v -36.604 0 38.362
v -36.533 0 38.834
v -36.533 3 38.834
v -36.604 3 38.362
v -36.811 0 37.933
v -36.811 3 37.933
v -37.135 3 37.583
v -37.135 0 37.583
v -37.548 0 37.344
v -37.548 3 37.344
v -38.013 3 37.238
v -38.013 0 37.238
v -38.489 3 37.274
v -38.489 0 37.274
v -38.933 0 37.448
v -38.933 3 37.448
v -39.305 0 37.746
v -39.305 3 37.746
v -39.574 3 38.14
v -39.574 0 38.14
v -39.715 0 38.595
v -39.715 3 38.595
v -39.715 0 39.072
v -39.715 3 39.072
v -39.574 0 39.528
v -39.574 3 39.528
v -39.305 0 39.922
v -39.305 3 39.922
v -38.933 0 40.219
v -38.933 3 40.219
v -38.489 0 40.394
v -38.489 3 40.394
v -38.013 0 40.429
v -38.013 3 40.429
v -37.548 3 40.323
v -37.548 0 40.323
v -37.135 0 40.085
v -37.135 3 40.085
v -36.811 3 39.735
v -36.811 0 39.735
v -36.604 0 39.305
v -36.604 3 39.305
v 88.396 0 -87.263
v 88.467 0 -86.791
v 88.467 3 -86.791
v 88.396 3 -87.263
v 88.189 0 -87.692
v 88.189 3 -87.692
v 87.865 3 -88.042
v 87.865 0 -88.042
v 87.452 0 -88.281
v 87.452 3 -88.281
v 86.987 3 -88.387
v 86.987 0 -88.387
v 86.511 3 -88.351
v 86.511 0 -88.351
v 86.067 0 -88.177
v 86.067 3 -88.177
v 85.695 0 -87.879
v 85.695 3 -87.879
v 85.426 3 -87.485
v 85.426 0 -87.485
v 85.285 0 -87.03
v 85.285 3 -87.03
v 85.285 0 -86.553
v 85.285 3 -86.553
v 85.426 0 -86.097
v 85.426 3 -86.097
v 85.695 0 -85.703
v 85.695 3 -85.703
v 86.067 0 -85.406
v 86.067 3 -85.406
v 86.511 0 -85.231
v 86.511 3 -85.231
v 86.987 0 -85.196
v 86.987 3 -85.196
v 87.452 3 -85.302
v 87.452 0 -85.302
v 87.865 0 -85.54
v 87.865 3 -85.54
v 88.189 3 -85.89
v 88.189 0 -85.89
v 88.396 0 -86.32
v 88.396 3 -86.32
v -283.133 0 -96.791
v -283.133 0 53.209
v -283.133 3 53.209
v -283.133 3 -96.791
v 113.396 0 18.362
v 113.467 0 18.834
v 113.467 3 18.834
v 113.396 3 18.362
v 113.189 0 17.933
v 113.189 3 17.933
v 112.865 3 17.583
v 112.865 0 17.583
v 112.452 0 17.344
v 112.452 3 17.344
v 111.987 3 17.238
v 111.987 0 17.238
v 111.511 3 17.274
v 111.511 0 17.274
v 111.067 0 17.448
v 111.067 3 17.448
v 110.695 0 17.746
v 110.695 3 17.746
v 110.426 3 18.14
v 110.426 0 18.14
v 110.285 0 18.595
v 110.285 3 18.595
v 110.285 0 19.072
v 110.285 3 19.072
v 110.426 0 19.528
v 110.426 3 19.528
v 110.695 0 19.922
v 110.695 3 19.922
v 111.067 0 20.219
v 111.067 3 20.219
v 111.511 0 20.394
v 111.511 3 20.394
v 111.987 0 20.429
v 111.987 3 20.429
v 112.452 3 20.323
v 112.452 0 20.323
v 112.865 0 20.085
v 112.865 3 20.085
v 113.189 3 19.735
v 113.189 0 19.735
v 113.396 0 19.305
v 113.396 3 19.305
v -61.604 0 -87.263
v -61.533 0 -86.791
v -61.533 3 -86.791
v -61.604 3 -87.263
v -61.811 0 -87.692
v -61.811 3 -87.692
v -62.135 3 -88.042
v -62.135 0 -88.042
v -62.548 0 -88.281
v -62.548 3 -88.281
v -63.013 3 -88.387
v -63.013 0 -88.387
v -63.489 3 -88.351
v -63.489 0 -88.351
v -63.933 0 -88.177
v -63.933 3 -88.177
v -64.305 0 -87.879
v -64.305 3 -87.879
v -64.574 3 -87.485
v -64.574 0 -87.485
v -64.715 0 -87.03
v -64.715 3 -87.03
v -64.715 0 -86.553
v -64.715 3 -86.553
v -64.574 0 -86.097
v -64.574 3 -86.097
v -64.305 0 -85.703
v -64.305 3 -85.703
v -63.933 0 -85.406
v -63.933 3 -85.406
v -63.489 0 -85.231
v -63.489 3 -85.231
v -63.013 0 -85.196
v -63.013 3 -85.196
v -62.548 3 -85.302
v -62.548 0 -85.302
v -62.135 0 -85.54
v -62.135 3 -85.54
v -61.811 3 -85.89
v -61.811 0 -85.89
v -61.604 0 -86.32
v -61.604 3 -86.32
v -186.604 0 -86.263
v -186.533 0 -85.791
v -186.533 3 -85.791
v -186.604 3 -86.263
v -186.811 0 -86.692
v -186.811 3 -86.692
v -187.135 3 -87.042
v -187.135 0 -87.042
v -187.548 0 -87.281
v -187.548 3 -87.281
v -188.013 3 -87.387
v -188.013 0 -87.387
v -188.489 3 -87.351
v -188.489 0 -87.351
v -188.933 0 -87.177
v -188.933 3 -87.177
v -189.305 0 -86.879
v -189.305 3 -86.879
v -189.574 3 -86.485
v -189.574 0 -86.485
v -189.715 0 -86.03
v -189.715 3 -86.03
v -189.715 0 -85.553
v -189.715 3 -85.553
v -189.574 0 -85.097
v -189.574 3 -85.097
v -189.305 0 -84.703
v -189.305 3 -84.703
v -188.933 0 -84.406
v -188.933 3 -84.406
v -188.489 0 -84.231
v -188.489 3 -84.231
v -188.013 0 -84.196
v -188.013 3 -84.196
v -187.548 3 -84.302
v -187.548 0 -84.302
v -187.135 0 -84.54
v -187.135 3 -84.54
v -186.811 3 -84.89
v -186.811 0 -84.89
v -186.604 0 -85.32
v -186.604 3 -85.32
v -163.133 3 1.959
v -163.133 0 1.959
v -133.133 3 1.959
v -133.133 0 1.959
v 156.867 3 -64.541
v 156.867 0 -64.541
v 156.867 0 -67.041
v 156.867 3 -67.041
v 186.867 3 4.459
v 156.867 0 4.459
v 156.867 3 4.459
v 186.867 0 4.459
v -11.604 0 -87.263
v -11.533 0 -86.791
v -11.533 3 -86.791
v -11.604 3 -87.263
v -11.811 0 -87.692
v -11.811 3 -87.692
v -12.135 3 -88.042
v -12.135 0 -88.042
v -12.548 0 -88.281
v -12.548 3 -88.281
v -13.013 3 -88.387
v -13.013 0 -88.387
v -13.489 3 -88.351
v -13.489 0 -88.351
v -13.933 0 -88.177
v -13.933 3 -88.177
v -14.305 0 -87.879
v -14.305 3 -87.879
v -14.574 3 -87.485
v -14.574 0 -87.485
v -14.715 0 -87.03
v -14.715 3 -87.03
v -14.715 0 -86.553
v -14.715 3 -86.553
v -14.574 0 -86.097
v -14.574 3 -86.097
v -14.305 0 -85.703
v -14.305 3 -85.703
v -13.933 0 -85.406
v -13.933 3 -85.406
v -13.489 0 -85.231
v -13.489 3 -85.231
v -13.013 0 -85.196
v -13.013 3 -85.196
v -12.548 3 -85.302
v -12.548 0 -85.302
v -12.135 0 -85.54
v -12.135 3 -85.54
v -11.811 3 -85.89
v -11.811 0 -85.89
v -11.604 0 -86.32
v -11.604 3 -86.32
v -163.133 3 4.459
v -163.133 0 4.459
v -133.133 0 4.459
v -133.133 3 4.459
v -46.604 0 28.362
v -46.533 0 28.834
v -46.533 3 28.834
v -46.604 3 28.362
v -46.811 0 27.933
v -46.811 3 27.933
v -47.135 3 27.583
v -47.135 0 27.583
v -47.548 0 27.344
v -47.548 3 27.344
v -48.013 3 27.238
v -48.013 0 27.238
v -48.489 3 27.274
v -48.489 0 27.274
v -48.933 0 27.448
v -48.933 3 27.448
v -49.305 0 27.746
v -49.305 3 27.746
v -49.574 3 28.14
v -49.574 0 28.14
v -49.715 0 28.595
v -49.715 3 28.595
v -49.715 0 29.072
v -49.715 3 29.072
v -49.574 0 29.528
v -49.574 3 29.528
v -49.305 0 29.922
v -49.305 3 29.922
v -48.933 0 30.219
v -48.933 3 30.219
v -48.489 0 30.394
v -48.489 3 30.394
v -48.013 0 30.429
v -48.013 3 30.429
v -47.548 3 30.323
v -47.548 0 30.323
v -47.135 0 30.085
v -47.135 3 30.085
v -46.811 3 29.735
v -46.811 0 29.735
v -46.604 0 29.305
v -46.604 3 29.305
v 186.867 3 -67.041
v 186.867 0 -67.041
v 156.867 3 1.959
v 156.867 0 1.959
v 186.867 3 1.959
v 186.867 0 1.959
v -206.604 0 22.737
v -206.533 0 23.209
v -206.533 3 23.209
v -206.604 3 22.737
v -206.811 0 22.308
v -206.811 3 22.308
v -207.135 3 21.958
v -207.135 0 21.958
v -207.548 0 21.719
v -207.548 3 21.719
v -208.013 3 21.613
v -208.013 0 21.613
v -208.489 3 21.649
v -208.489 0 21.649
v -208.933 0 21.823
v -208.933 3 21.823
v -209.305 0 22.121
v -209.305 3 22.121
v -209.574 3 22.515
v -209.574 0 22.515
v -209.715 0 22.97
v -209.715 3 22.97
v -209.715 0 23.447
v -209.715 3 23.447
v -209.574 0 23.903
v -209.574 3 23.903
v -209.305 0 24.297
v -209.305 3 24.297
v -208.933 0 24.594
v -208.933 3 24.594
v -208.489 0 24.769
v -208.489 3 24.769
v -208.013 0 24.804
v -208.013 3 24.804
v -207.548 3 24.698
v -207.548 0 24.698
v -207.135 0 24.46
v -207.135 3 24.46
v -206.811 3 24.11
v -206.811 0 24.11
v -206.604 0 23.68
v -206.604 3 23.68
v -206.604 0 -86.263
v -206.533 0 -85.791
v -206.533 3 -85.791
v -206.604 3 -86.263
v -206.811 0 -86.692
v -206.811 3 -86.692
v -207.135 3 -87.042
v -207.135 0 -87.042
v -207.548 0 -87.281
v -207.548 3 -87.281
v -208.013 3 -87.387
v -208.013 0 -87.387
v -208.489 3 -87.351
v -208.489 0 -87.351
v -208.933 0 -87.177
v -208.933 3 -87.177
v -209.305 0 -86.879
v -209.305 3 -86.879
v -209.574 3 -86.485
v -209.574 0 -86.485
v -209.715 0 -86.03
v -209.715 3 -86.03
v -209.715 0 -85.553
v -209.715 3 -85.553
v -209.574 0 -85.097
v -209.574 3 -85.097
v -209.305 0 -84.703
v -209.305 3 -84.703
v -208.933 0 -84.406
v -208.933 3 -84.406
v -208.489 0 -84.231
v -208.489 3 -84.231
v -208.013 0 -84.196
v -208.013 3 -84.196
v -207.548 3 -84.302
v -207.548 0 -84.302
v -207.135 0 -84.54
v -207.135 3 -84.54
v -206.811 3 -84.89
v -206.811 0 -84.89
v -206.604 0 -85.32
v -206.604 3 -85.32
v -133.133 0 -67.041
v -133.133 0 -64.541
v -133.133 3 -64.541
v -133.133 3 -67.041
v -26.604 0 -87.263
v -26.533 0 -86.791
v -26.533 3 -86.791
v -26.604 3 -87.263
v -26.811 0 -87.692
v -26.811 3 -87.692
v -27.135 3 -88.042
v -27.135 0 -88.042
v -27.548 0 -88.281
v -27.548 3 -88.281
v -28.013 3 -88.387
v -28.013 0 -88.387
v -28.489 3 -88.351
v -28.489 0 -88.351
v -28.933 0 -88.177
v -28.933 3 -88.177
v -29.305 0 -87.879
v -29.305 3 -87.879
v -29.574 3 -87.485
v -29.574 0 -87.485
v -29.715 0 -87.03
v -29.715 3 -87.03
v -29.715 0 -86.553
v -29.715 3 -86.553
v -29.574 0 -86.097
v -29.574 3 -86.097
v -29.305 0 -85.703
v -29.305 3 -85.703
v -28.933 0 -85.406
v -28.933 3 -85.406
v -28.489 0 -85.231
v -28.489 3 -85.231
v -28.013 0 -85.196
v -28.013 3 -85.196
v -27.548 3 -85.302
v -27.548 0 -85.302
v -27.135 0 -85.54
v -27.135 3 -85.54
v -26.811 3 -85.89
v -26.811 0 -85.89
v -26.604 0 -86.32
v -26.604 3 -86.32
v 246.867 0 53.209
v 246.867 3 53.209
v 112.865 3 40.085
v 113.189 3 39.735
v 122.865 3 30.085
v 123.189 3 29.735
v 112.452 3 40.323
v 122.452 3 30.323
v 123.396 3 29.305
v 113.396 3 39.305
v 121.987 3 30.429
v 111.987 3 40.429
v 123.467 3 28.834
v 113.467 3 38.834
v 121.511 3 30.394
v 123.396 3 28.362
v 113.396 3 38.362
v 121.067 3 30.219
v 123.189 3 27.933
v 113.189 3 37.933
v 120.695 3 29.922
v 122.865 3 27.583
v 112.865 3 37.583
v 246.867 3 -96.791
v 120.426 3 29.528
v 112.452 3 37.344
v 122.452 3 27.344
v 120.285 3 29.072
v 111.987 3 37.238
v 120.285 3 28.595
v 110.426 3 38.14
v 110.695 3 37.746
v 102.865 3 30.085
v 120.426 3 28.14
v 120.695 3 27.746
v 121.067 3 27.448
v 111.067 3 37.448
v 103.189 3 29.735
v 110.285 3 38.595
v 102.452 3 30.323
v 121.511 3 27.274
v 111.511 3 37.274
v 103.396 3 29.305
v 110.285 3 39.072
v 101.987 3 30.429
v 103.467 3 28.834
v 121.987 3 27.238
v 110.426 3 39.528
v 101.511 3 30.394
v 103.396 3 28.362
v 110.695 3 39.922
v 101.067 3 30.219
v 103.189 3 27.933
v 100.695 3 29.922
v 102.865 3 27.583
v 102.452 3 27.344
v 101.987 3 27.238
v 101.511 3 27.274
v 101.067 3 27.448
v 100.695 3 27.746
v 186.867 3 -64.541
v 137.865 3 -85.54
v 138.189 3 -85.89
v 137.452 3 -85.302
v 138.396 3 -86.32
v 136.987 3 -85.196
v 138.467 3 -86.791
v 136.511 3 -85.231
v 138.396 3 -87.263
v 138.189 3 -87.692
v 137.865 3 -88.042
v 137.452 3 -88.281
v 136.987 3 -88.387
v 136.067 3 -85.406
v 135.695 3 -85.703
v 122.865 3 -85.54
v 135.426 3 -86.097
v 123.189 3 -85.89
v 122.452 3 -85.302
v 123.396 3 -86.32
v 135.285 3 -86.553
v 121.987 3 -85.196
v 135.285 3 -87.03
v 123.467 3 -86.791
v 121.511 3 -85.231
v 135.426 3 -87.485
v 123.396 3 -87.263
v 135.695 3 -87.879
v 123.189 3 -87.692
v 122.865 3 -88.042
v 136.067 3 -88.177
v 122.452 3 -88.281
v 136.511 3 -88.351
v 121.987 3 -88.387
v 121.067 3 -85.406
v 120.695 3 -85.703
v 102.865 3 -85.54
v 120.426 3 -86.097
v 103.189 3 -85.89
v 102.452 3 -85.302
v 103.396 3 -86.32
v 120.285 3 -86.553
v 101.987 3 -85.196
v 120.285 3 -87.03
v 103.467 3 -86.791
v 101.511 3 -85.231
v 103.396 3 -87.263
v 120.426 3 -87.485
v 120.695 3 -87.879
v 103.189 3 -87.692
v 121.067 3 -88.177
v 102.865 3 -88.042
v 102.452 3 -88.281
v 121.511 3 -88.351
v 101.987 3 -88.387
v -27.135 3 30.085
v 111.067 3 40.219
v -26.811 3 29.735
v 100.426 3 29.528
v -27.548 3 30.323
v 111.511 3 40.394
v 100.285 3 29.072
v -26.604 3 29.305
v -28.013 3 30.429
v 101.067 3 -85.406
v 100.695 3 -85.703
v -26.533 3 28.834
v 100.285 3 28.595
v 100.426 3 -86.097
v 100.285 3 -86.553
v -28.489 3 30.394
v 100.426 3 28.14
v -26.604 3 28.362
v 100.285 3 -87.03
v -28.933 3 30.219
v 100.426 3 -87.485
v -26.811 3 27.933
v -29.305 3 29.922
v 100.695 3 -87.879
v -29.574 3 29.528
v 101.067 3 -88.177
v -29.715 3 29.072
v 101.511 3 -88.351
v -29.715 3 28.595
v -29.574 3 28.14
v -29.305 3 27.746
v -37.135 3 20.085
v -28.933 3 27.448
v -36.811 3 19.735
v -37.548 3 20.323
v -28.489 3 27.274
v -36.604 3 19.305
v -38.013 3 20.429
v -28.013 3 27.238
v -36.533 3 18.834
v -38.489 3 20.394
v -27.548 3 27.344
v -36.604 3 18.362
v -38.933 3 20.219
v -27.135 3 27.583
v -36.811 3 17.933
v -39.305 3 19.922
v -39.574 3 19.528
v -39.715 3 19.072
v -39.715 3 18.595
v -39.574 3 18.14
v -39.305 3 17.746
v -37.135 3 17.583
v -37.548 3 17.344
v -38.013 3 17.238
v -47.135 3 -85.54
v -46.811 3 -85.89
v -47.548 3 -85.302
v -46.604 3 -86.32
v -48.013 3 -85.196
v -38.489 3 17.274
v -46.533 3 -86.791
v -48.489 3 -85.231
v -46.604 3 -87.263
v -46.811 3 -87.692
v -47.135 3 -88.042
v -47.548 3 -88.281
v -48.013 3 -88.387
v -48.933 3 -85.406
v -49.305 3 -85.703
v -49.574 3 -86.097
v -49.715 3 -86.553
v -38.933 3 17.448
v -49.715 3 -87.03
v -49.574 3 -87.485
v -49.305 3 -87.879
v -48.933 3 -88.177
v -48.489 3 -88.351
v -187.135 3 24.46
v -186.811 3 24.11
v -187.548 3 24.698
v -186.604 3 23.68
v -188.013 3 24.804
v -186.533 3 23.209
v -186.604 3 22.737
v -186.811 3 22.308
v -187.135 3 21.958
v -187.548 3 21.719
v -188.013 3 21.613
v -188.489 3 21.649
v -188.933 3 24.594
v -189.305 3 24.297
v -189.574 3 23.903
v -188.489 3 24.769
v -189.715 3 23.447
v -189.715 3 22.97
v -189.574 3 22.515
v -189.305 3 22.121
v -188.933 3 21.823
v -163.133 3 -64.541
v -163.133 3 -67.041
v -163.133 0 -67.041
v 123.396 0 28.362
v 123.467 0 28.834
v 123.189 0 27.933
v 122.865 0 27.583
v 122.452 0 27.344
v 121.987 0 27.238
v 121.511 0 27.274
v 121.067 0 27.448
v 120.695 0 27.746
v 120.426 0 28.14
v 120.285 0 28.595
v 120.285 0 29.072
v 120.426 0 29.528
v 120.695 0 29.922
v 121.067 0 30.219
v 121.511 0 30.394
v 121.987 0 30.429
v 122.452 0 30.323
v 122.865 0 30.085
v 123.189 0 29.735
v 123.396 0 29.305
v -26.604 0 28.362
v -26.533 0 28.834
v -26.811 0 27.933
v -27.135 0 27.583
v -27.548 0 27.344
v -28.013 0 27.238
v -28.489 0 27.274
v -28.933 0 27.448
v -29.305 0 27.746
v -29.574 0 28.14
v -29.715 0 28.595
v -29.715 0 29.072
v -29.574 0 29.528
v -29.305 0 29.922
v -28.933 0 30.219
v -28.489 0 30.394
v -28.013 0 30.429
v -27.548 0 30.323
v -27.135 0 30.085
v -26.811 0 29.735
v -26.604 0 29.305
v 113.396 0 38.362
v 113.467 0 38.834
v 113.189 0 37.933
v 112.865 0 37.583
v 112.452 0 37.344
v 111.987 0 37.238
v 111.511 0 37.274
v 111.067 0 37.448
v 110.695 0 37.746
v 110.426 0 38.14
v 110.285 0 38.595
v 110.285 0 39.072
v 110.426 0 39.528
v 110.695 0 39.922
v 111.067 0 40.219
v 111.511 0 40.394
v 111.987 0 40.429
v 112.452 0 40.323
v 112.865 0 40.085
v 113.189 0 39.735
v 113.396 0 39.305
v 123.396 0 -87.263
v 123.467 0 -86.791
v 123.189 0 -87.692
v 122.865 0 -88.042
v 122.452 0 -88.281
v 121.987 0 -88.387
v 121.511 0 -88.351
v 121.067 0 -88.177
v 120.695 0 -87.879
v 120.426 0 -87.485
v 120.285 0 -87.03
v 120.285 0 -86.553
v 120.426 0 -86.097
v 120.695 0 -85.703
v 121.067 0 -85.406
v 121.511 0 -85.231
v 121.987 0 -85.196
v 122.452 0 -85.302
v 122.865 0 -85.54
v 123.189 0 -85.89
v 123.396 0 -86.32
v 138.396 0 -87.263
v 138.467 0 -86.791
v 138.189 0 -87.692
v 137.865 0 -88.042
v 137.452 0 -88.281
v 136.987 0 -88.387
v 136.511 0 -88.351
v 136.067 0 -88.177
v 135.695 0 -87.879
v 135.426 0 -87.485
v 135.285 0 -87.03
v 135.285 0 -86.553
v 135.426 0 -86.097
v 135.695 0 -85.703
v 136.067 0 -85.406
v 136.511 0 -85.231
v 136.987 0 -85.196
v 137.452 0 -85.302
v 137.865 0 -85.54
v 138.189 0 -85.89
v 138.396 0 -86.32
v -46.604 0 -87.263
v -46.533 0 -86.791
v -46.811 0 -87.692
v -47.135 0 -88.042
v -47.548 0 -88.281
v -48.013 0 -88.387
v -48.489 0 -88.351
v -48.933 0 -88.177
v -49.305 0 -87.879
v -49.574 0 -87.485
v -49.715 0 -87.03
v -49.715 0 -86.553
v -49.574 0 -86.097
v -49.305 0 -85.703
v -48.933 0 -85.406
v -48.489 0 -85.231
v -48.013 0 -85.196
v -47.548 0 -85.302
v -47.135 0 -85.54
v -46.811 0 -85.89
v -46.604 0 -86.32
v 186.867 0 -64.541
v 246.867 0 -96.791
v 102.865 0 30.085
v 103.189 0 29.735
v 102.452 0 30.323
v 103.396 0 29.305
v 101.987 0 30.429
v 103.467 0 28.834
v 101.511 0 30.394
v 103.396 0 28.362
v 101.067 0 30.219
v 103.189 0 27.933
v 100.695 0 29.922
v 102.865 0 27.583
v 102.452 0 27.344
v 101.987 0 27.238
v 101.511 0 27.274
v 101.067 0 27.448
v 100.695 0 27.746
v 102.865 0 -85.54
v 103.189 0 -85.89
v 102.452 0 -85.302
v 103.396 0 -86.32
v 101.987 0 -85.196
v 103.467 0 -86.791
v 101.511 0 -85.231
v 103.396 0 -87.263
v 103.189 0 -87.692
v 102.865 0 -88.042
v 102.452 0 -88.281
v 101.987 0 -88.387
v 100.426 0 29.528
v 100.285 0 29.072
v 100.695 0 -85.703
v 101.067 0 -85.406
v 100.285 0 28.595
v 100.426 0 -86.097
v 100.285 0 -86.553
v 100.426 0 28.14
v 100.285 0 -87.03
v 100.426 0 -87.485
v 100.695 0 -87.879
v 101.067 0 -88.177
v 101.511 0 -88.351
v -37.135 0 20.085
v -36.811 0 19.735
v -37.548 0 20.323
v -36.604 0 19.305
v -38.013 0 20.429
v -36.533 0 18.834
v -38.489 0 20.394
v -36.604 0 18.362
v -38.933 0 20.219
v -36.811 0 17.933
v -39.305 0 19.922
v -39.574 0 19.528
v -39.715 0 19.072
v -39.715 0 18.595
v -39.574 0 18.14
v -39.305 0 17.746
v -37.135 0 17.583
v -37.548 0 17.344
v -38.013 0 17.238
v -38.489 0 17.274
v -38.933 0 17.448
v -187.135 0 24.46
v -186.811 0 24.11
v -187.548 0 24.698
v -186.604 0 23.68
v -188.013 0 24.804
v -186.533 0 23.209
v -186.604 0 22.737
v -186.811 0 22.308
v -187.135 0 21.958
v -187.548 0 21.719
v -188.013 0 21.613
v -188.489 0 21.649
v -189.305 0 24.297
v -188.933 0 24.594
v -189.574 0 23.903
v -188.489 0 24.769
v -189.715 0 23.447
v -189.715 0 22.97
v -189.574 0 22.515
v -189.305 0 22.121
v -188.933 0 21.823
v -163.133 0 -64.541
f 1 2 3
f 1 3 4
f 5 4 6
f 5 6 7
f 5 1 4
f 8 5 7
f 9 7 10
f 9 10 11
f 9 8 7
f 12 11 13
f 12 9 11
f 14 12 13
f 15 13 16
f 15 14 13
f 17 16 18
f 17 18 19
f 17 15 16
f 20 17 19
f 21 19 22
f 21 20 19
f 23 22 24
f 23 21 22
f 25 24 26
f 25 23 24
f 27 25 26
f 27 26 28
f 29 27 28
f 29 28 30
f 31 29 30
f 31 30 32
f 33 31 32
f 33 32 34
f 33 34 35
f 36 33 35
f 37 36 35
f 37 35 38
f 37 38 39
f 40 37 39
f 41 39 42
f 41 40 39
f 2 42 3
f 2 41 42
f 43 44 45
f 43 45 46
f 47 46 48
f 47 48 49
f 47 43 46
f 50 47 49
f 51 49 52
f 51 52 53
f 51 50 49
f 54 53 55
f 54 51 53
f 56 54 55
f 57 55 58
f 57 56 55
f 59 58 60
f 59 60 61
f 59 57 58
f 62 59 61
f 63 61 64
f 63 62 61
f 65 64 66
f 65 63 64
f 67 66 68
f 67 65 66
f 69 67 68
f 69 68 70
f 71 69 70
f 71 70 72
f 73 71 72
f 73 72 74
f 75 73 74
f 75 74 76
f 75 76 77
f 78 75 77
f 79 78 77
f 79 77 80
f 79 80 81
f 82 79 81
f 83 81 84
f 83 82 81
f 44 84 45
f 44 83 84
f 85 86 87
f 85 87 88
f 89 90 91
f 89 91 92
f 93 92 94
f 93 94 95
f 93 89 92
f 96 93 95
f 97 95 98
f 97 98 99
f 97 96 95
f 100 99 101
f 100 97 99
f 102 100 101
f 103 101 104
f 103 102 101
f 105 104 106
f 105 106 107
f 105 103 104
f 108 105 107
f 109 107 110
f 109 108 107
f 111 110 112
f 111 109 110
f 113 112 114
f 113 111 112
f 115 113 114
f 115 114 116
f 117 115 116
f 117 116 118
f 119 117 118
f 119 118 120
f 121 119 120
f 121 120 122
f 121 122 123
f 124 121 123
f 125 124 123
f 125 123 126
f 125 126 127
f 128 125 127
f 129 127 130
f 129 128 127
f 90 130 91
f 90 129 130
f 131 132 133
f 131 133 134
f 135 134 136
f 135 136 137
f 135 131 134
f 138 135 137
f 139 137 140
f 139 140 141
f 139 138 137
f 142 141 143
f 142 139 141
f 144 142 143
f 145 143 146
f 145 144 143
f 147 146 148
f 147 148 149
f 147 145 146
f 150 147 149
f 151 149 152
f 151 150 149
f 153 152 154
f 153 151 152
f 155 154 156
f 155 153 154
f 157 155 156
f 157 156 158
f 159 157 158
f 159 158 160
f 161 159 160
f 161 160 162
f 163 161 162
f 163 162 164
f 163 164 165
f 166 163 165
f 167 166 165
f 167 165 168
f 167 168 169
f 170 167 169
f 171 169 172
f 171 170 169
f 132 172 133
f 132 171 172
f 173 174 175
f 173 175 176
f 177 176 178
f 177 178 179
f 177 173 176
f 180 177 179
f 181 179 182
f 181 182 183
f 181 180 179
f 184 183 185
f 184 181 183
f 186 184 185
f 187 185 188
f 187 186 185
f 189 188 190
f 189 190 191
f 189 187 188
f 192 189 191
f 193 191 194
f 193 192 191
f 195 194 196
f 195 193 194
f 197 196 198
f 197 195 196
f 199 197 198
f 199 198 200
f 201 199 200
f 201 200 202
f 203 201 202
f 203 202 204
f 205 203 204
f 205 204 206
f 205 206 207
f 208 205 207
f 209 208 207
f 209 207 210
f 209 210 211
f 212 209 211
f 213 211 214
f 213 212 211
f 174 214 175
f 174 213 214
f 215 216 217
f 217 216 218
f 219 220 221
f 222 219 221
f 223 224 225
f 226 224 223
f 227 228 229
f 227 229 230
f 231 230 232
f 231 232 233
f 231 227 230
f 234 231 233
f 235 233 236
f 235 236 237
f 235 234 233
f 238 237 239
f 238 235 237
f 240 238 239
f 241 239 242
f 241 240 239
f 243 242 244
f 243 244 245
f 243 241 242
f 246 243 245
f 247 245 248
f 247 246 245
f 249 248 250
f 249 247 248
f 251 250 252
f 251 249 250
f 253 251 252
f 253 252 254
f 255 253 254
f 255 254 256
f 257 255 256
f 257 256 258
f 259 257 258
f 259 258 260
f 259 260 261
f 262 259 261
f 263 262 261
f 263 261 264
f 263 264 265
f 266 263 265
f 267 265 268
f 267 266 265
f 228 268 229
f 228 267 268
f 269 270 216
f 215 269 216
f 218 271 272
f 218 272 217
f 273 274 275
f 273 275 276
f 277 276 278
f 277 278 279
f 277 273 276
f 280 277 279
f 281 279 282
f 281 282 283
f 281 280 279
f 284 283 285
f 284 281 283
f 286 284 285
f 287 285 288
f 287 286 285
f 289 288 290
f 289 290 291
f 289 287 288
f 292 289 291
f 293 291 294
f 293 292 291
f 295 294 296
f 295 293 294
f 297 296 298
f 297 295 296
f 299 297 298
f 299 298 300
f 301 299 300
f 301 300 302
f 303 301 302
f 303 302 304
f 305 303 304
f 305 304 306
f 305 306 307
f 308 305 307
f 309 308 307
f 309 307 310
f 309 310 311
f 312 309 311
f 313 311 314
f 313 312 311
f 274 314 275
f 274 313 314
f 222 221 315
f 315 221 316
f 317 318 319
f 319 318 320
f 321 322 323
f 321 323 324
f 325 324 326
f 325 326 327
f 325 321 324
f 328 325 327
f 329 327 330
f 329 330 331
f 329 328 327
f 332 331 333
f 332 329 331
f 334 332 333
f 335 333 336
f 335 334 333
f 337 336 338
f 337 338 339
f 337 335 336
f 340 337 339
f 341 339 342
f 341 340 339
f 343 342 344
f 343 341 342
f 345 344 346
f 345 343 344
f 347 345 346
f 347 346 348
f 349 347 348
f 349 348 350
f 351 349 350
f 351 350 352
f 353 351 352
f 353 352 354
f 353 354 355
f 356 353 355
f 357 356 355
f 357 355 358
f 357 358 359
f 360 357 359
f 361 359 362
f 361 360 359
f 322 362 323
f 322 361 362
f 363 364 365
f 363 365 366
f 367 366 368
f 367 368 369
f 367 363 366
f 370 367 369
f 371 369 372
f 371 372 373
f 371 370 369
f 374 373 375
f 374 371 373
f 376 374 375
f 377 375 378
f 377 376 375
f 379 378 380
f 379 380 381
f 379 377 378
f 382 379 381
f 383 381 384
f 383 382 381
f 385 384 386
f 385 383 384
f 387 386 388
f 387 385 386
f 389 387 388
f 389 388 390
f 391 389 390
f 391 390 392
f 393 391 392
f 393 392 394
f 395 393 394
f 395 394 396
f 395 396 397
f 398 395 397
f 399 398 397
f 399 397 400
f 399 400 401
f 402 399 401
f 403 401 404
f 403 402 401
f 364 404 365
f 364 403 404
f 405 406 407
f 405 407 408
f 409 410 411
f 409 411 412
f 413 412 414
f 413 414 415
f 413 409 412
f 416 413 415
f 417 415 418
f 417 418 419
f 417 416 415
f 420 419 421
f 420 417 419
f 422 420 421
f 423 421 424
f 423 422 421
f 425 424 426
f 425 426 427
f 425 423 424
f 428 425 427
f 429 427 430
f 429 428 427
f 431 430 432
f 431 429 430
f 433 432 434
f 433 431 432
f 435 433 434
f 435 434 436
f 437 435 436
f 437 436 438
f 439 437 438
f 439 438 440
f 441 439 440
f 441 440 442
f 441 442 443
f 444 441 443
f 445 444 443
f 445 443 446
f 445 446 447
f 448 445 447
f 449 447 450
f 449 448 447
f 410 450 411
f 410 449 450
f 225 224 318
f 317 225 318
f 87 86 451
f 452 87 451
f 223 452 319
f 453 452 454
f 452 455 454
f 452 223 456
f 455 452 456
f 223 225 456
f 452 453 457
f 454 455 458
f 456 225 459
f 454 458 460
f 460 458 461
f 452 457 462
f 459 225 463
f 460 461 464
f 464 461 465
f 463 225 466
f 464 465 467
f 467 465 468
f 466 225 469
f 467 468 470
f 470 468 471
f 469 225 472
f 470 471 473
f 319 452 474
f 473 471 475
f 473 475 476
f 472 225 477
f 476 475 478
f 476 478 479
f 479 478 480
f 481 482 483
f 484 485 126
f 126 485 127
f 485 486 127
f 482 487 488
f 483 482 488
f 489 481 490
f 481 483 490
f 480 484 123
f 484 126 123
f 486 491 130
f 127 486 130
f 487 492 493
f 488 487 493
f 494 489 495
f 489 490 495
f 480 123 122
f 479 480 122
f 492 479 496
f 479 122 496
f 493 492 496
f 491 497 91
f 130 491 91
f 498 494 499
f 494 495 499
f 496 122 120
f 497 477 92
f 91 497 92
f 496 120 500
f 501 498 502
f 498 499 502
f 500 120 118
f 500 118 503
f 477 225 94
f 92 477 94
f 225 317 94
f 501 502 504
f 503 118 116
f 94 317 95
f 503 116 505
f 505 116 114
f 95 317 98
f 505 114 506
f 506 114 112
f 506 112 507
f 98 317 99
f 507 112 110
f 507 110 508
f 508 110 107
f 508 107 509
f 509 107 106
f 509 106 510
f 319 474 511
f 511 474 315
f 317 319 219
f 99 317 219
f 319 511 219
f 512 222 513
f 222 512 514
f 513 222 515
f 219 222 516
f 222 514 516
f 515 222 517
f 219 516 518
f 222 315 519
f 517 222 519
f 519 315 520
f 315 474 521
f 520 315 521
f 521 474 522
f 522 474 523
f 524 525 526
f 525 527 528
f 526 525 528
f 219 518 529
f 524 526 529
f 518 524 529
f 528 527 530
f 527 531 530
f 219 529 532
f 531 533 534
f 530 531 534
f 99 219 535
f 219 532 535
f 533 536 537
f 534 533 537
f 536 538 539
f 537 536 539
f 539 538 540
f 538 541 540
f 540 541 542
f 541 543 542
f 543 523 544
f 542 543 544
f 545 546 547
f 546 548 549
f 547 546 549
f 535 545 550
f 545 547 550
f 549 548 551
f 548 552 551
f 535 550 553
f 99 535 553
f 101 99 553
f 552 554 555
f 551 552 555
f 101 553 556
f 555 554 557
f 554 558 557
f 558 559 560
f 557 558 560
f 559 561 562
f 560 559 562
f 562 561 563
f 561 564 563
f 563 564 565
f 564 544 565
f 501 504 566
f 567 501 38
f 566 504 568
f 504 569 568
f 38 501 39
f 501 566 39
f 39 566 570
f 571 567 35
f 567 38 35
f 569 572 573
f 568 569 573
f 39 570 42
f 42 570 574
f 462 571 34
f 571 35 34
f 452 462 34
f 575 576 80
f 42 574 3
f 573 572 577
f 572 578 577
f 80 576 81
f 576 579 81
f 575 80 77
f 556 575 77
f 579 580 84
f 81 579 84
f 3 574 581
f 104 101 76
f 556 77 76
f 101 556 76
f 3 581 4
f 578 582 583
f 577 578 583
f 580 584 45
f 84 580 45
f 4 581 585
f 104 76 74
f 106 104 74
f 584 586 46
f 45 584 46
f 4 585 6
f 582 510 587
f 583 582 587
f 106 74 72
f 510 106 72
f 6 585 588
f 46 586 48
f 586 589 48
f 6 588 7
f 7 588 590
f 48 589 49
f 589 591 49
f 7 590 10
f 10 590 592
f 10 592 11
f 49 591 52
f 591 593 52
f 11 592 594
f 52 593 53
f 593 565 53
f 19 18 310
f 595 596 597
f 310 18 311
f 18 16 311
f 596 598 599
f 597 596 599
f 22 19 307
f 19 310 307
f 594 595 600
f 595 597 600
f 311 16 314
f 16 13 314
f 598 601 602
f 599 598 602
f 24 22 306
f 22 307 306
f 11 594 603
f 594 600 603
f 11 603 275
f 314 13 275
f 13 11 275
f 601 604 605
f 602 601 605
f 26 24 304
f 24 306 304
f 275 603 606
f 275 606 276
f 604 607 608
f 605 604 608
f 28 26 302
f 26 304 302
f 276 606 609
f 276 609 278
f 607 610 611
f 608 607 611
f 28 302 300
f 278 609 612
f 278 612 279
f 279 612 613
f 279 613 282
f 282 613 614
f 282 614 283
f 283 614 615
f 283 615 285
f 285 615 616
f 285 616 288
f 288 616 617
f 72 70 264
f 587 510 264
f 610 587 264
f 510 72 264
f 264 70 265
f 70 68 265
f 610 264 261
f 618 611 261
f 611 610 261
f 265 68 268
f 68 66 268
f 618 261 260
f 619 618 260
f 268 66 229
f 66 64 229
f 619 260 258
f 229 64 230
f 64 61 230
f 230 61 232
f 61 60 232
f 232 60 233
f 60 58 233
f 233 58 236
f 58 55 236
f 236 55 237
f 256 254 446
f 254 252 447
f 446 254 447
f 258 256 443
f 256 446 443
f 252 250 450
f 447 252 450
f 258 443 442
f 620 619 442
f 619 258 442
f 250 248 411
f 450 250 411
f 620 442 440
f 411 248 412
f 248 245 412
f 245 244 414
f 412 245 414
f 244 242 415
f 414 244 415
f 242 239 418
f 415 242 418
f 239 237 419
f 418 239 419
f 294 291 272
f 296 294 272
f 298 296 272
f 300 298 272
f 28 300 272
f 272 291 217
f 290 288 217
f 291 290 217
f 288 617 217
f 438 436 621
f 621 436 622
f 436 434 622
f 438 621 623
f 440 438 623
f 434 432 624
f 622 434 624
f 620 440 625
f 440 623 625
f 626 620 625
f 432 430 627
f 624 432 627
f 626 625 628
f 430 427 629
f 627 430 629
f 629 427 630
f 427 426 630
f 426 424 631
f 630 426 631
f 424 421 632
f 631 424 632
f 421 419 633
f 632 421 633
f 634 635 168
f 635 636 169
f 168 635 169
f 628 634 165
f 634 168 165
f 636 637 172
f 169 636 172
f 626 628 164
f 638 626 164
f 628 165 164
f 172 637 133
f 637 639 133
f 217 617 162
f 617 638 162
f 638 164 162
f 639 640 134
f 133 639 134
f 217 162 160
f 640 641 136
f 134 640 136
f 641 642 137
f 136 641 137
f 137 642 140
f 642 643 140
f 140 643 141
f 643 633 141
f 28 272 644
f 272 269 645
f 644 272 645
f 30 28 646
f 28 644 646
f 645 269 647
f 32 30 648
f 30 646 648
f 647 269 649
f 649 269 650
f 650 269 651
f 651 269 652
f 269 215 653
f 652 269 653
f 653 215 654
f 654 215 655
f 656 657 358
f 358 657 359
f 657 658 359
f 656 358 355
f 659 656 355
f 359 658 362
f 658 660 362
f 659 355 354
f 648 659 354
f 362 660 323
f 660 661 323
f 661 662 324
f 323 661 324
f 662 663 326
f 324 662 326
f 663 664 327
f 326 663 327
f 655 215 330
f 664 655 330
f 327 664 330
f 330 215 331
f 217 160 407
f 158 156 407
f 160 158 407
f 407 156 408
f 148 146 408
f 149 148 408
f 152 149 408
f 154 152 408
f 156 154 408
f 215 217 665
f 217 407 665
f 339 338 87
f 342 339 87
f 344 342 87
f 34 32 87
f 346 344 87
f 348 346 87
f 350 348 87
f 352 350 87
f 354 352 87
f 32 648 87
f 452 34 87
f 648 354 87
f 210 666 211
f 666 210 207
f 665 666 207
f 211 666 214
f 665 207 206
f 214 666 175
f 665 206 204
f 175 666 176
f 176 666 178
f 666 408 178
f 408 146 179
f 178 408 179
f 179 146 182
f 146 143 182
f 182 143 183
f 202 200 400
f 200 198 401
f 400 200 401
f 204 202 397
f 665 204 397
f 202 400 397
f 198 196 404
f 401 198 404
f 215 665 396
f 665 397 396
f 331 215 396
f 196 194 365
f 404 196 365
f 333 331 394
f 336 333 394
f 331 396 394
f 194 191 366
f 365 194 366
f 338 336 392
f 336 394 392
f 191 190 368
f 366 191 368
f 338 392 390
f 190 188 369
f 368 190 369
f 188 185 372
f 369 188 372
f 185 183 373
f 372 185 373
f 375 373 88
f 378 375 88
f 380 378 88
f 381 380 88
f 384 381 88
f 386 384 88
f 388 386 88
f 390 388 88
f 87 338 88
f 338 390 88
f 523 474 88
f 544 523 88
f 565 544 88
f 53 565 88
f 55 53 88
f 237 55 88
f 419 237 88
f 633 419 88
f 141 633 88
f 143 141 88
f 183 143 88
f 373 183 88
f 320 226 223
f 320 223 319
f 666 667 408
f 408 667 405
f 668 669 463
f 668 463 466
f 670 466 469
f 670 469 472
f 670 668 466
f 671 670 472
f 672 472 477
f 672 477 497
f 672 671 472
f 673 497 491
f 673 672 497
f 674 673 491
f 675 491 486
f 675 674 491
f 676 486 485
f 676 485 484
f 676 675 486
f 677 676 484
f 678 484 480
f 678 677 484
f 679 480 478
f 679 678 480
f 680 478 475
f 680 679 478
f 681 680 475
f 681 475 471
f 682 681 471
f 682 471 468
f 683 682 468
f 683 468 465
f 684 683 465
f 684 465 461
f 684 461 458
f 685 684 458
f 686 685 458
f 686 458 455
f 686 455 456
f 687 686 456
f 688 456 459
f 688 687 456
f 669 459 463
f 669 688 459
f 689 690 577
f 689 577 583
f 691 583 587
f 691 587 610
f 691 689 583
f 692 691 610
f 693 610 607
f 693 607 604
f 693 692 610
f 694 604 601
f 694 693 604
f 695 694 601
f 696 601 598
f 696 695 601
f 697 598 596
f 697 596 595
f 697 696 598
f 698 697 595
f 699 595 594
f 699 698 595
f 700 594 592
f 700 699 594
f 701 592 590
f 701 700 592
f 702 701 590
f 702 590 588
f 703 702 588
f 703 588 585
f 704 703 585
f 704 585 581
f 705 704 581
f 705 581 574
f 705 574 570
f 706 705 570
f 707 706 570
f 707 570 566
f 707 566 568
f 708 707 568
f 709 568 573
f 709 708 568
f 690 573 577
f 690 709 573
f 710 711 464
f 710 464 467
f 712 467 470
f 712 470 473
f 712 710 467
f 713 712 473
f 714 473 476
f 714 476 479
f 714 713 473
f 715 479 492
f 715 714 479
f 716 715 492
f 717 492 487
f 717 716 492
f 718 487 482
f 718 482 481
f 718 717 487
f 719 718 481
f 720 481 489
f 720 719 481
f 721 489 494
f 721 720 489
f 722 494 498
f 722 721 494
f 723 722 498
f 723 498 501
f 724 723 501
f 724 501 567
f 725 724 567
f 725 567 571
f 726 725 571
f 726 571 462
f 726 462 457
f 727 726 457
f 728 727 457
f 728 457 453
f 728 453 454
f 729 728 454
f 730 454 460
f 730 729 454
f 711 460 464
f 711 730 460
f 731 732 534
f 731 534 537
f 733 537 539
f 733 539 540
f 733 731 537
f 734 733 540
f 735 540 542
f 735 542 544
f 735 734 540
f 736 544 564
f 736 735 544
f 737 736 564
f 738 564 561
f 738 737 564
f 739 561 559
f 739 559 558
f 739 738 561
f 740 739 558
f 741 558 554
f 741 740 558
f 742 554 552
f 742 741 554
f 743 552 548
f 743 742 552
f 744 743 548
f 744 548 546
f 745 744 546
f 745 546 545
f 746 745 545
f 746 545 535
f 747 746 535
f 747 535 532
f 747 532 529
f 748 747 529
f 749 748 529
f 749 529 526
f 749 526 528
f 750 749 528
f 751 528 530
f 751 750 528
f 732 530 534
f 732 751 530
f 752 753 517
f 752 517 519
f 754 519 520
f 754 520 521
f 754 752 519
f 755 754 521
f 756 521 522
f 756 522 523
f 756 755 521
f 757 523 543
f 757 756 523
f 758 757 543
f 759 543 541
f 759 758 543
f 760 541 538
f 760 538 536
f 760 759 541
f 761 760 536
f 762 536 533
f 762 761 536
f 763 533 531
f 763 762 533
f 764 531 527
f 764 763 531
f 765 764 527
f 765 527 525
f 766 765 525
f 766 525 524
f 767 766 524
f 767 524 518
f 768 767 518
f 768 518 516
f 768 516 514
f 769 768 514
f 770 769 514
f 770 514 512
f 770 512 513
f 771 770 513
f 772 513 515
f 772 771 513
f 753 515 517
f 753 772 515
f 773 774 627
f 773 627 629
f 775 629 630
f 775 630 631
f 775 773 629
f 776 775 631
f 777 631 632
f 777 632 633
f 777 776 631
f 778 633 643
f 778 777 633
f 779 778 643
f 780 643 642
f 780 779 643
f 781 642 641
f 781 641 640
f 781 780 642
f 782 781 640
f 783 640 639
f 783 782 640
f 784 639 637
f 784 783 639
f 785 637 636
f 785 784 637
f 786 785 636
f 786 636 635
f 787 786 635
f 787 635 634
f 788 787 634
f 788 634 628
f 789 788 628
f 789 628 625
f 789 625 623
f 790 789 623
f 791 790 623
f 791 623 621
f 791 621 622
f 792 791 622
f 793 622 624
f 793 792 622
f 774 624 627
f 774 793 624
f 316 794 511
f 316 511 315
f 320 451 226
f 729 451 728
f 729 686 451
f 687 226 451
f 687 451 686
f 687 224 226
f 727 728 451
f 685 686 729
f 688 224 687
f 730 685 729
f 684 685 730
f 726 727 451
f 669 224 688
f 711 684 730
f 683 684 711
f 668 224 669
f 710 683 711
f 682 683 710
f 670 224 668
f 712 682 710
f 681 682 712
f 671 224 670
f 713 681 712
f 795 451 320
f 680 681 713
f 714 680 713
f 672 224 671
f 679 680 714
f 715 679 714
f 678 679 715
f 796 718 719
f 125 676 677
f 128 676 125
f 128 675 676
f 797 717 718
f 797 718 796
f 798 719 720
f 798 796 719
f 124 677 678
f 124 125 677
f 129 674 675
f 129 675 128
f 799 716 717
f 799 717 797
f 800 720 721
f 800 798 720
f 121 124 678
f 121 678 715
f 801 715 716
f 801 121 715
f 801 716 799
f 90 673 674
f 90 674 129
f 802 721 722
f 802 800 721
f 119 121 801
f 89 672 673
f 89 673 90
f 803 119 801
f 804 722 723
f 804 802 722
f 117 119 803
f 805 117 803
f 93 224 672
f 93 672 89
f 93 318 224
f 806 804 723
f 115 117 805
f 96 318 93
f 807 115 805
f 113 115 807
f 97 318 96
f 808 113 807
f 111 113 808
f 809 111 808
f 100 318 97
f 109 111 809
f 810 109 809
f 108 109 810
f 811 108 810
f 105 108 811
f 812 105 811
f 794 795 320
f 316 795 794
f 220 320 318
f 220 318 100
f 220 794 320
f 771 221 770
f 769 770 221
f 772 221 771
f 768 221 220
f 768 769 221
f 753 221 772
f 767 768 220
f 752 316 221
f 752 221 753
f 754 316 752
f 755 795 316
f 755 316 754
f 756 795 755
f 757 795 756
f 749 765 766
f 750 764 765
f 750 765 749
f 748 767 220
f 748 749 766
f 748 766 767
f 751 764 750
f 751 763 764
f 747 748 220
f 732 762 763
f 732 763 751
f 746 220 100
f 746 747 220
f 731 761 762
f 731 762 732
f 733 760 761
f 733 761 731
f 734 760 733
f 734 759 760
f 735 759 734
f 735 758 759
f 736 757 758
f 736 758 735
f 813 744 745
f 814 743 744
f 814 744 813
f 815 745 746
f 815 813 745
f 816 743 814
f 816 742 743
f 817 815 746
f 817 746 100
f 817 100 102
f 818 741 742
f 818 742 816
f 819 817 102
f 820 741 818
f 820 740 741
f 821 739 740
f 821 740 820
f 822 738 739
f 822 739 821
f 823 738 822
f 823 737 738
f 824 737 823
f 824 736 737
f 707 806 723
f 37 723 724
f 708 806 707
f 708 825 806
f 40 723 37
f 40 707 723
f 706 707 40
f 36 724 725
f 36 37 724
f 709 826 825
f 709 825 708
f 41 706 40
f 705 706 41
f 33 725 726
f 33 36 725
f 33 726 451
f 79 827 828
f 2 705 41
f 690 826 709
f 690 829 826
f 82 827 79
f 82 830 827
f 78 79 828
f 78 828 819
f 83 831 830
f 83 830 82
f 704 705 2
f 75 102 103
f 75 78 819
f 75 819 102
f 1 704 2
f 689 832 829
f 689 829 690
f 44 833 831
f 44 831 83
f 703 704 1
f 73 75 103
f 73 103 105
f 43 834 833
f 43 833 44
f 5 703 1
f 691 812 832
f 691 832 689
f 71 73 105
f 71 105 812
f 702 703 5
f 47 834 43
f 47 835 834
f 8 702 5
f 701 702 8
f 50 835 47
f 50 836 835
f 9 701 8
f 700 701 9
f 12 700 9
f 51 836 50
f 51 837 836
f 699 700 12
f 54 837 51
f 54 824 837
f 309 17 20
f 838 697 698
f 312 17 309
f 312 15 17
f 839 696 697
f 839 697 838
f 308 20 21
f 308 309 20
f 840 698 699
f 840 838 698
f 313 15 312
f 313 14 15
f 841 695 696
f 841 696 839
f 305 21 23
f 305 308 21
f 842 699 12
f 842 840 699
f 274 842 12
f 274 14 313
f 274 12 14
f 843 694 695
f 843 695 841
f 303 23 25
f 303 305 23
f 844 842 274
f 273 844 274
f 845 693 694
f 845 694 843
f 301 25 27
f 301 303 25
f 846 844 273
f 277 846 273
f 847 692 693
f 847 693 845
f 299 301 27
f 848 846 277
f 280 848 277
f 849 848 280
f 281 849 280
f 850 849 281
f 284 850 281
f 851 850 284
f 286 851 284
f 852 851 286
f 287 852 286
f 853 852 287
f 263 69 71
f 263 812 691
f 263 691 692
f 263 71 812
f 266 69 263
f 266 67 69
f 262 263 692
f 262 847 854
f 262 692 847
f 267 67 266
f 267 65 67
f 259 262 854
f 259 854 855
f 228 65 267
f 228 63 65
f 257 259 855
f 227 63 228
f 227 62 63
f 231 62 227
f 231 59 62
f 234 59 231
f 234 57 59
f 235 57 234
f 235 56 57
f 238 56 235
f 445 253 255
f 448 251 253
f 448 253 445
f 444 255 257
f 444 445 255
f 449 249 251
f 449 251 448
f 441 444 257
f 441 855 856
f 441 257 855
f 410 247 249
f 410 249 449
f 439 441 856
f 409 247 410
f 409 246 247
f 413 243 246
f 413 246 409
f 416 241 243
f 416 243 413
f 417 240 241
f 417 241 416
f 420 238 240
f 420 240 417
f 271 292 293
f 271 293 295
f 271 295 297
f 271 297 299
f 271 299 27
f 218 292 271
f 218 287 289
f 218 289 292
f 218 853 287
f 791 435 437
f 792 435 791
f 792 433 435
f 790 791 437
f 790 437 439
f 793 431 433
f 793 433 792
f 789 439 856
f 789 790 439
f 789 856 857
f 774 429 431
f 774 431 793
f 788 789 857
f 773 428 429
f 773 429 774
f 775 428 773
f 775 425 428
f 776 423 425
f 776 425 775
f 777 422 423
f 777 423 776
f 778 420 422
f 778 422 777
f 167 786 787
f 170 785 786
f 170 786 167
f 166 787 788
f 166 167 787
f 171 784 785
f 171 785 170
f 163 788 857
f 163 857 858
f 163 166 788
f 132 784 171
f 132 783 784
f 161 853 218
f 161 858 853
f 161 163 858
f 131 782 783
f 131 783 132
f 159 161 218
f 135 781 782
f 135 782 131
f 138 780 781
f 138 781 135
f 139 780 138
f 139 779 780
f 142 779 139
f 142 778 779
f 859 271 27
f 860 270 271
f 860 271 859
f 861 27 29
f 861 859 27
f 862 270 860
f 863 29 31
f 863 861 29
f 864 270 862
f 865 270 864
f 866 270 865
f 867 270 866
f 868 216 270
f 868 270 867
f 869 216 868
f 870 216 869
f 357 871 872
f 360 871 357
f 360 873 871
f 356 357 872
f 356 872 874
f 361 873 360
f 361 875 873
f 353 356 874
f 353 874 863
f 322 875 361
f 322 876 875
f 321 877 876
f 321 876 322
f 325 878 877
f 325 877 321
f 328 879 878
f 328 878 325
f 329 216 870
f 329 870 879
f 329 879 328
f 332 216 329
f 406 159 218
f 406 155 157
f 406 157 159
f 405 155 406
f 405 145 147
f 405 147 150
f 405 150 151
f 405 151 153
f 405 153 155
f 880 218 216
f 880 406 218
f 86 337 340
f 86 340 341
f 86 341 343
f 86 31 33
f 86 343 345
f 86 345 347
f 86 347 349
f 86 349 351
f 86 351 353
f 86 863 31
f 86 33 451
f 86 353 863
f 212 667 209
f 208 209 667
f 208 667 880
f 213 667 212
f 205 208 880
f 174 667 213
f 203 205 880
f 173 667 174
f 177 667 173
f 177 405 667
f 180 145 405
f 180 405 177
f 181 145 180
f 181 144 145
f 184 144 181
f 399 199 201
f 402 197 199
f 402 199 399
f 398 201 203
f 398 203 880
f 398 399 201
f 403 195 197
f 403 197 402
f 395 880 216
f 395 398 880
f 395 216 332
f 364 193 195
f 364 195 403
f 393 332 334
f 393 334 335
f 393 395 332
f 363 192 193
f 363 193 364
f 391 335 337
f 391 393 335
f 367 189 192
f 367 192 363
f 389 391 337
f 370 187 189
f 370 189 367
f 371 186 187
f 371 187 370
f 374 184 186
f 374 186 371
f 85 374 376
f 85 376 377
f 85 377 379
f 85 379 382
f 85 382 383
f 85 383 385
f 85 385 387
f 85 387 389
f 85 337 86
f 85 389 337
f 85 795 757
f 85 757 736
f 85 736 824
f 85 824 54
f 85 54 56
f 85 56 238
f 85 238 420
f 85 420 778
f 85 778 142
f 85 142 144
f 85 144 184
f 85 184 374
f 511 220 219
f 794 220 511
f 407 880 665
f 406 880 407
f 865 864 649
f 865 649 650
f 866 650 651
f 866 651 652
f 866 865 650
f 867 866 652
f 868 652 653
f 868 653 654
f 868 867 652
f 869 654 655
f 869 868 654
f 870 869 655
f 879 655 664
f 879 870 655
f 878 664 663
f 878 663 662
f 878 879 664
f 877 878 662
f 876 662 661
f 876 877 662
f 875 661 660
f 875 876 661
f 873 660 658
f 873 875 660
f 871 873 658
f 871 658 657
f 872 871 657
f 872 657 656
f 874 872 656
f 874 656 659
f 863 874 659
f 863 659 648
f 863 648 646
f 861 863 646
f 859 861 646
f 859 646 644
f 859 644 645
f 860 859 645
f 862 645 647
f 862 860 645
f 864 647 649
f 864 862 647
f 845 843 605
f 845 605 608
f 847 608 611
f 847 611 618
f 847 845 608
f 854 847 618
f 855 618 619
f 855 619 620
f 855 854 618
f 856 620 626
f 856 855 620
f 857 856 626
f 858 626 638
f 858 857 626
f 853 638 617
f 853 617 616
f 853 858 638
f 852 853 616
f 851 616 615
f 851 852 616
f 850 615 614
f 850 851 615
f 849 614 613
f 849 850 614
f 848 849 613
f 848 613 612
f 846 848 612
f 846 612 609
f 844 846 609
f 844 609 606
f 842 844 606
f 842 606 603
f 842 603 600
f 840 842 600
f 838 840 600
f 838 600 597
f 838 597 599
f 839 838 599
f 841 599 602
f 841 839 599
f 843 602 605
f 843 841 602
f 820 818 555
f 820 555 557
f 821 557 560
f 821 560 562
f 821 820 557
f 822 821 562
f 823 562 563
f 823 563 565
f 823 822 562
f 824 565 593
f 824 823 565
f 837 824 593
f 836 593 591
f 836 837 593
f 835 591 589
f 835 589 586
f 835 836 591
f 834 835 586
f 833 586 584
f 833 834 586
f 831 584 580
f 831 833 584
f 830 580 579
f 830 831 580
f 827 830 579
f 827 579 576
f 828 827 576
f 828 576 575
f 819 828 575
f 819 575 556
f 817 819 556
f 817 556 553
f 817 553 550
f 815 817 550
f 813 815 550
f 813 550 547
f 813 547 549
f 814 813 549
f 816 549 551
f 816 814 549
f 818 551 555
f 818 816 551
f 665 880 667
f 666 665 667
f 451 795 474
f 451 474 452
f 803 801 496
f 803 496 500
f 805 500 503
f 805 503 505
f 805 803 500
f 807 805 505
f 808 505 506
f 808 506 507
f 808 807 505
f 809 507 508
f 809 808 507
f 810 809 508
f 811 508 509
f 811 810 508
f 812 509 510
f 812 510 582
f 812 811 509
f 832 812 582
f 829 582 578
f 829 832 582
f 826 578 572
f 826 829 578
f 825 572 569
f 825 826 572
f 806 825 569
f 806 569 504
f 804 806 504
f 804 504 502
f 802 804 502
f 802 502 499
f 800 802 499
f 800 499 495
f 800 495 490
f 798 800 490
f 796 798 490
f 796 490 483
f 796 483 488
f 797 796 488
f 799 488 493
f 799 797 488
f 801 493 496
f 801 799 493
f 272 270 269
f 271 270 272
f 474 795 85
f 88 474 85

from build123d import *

# Parameters (mm, degrees)
SKETCH_1_R      = 1.6
SKETCH_1_W      = 30
SKETCH_1_H      = 2.5
EXTRUDE_1_DEPTH = 3


with BuildPart() as part:
    # 草图1 → 凸台-拉伸1 (new body)
    with BuildSketch(Plane(origin=(0, 0, 0), x_dir=(1, 0, 0), z_dir=(0, 1, 0))):
        Polygon((-223.132505708, 96.791149389), (246.867494292, 96.791149389), (246.867494292, -53.208850611), (-223.132505708, -53.208850611), (-283.132505708, -53.208850611), (-283.132505708, 96.791149389), align=None)
        with Locations((-208.132505708, -23.208850611)):
            Circle(SKETCH_1_R, mode=Mode.SUBTRACT)
        with Locations((-188.132505708, -23.208850611)):
            Circle(SKETCH_1_R, mode=Mode.SUBTRACT)
        with Locations((-208.132505708, 85.791149389)):
            Circle(SKETCH_1_R, mode=Mode.SUBTRACT)
        with Locations((-188.132505708, 85.791149389)):
            Circle(SKETCH_1_R, mode=Mode.SUBTRACT)
        with Locations((-48.132505708, -28.833850611)):
            Circle(SKETCH_1_R, mode=Mode.SUBTRACT)
        with Locations((-38.132505708, -38.833850611)):
            Circle(SKETCH_1_R, mode=Mode.SUBTRACT)
        with Locations((-28.132505708, -28.833850611)):
            Circle(SKETCH_1_R, mode=Mode.SUBTRACT)
        with Locations((-38.132505708, -18.833850611)):
            Circle(SKETCH_1_R, mode=Mode.SUBTRACT)
        with Locations((101.867494292, -28.833850611)):
            Circle(SKETCH_1_R, mode=Mode.SUBTRACT)
        with Locations((111.867494292, -18.833850611)):
            Circle(SKETCH_1_R, mode=Mode.SUBTRACT)
        with Locations((121.867494292, -28.833850611)):
            Circle(SKETCH_1_R, mode=Mode.SUBTRACT)
        with Locations((111.867494292, -38.833850611)):
            Circle(SKETCH_1_R, mode=Mode.SUBTRACT)
        with Locations((-63.132505708, 86.791149389)):
            Circle(SKETCH_1_R, mode=Mode.SUBTRACT)
        with Locations((-48.132505708, 86.791149389)):
            Circle(SKETCH_1_R, mode=Mode.SUBTRACT)
        with Locations((-28.132505708, 86.791149389)):
            Circle(SKETCH_1_R, mode=Mode.SUBTRACT)
        with Locations((-13.132505708, 86.791149389)):
            Circle(SKETCH_1_R, mode=Mode.SUBTRACT)
        with Locations((86.867494292, 86.791149389)):
            Circle(SKETCH_1_R, mode=Mode.SUBTRACT)
        with Locations((101.867494292, 86.791149389)):
            Circle(SKETCH_1_R, mode=Mode.SUBTRACT)
        with Locations((136.867494292, 86.791149389)):
            Circle(SKETCH_1_R, mode=Mode.SUBTRACT)
        with Locations((121.867494292, 86.791149389)):
            Circle(SKETCH_1_R, mode=Mode.SUBTRACT)
        with Locations((-148.132505708, -3.208850611)):
            Rectangle(SKETCH_1_W, SKETCH_1_H, mode=Mode.SUBTRACT)
        with Locations((171.867494292, -3.208850611)):
            Rectangle(SKETCH_1_W, SKETCH_1_H, mode=Mode.SUBTRACT)
        with Locations((171.867494292, 65.791149389)):
            Rectangle(SKETCH_1_W, SKETCH_1_H, mode=Mode.SUBTRACT)
        with Locations((-148.132505708, 65.791149389)):
            Rectangle(SKETCH_1_W, SKETCH_1_H, mode=Mode.SUBTRACT)
    extrude(amount=EXTRUDE_1_DEPTH)


solid = part.part
